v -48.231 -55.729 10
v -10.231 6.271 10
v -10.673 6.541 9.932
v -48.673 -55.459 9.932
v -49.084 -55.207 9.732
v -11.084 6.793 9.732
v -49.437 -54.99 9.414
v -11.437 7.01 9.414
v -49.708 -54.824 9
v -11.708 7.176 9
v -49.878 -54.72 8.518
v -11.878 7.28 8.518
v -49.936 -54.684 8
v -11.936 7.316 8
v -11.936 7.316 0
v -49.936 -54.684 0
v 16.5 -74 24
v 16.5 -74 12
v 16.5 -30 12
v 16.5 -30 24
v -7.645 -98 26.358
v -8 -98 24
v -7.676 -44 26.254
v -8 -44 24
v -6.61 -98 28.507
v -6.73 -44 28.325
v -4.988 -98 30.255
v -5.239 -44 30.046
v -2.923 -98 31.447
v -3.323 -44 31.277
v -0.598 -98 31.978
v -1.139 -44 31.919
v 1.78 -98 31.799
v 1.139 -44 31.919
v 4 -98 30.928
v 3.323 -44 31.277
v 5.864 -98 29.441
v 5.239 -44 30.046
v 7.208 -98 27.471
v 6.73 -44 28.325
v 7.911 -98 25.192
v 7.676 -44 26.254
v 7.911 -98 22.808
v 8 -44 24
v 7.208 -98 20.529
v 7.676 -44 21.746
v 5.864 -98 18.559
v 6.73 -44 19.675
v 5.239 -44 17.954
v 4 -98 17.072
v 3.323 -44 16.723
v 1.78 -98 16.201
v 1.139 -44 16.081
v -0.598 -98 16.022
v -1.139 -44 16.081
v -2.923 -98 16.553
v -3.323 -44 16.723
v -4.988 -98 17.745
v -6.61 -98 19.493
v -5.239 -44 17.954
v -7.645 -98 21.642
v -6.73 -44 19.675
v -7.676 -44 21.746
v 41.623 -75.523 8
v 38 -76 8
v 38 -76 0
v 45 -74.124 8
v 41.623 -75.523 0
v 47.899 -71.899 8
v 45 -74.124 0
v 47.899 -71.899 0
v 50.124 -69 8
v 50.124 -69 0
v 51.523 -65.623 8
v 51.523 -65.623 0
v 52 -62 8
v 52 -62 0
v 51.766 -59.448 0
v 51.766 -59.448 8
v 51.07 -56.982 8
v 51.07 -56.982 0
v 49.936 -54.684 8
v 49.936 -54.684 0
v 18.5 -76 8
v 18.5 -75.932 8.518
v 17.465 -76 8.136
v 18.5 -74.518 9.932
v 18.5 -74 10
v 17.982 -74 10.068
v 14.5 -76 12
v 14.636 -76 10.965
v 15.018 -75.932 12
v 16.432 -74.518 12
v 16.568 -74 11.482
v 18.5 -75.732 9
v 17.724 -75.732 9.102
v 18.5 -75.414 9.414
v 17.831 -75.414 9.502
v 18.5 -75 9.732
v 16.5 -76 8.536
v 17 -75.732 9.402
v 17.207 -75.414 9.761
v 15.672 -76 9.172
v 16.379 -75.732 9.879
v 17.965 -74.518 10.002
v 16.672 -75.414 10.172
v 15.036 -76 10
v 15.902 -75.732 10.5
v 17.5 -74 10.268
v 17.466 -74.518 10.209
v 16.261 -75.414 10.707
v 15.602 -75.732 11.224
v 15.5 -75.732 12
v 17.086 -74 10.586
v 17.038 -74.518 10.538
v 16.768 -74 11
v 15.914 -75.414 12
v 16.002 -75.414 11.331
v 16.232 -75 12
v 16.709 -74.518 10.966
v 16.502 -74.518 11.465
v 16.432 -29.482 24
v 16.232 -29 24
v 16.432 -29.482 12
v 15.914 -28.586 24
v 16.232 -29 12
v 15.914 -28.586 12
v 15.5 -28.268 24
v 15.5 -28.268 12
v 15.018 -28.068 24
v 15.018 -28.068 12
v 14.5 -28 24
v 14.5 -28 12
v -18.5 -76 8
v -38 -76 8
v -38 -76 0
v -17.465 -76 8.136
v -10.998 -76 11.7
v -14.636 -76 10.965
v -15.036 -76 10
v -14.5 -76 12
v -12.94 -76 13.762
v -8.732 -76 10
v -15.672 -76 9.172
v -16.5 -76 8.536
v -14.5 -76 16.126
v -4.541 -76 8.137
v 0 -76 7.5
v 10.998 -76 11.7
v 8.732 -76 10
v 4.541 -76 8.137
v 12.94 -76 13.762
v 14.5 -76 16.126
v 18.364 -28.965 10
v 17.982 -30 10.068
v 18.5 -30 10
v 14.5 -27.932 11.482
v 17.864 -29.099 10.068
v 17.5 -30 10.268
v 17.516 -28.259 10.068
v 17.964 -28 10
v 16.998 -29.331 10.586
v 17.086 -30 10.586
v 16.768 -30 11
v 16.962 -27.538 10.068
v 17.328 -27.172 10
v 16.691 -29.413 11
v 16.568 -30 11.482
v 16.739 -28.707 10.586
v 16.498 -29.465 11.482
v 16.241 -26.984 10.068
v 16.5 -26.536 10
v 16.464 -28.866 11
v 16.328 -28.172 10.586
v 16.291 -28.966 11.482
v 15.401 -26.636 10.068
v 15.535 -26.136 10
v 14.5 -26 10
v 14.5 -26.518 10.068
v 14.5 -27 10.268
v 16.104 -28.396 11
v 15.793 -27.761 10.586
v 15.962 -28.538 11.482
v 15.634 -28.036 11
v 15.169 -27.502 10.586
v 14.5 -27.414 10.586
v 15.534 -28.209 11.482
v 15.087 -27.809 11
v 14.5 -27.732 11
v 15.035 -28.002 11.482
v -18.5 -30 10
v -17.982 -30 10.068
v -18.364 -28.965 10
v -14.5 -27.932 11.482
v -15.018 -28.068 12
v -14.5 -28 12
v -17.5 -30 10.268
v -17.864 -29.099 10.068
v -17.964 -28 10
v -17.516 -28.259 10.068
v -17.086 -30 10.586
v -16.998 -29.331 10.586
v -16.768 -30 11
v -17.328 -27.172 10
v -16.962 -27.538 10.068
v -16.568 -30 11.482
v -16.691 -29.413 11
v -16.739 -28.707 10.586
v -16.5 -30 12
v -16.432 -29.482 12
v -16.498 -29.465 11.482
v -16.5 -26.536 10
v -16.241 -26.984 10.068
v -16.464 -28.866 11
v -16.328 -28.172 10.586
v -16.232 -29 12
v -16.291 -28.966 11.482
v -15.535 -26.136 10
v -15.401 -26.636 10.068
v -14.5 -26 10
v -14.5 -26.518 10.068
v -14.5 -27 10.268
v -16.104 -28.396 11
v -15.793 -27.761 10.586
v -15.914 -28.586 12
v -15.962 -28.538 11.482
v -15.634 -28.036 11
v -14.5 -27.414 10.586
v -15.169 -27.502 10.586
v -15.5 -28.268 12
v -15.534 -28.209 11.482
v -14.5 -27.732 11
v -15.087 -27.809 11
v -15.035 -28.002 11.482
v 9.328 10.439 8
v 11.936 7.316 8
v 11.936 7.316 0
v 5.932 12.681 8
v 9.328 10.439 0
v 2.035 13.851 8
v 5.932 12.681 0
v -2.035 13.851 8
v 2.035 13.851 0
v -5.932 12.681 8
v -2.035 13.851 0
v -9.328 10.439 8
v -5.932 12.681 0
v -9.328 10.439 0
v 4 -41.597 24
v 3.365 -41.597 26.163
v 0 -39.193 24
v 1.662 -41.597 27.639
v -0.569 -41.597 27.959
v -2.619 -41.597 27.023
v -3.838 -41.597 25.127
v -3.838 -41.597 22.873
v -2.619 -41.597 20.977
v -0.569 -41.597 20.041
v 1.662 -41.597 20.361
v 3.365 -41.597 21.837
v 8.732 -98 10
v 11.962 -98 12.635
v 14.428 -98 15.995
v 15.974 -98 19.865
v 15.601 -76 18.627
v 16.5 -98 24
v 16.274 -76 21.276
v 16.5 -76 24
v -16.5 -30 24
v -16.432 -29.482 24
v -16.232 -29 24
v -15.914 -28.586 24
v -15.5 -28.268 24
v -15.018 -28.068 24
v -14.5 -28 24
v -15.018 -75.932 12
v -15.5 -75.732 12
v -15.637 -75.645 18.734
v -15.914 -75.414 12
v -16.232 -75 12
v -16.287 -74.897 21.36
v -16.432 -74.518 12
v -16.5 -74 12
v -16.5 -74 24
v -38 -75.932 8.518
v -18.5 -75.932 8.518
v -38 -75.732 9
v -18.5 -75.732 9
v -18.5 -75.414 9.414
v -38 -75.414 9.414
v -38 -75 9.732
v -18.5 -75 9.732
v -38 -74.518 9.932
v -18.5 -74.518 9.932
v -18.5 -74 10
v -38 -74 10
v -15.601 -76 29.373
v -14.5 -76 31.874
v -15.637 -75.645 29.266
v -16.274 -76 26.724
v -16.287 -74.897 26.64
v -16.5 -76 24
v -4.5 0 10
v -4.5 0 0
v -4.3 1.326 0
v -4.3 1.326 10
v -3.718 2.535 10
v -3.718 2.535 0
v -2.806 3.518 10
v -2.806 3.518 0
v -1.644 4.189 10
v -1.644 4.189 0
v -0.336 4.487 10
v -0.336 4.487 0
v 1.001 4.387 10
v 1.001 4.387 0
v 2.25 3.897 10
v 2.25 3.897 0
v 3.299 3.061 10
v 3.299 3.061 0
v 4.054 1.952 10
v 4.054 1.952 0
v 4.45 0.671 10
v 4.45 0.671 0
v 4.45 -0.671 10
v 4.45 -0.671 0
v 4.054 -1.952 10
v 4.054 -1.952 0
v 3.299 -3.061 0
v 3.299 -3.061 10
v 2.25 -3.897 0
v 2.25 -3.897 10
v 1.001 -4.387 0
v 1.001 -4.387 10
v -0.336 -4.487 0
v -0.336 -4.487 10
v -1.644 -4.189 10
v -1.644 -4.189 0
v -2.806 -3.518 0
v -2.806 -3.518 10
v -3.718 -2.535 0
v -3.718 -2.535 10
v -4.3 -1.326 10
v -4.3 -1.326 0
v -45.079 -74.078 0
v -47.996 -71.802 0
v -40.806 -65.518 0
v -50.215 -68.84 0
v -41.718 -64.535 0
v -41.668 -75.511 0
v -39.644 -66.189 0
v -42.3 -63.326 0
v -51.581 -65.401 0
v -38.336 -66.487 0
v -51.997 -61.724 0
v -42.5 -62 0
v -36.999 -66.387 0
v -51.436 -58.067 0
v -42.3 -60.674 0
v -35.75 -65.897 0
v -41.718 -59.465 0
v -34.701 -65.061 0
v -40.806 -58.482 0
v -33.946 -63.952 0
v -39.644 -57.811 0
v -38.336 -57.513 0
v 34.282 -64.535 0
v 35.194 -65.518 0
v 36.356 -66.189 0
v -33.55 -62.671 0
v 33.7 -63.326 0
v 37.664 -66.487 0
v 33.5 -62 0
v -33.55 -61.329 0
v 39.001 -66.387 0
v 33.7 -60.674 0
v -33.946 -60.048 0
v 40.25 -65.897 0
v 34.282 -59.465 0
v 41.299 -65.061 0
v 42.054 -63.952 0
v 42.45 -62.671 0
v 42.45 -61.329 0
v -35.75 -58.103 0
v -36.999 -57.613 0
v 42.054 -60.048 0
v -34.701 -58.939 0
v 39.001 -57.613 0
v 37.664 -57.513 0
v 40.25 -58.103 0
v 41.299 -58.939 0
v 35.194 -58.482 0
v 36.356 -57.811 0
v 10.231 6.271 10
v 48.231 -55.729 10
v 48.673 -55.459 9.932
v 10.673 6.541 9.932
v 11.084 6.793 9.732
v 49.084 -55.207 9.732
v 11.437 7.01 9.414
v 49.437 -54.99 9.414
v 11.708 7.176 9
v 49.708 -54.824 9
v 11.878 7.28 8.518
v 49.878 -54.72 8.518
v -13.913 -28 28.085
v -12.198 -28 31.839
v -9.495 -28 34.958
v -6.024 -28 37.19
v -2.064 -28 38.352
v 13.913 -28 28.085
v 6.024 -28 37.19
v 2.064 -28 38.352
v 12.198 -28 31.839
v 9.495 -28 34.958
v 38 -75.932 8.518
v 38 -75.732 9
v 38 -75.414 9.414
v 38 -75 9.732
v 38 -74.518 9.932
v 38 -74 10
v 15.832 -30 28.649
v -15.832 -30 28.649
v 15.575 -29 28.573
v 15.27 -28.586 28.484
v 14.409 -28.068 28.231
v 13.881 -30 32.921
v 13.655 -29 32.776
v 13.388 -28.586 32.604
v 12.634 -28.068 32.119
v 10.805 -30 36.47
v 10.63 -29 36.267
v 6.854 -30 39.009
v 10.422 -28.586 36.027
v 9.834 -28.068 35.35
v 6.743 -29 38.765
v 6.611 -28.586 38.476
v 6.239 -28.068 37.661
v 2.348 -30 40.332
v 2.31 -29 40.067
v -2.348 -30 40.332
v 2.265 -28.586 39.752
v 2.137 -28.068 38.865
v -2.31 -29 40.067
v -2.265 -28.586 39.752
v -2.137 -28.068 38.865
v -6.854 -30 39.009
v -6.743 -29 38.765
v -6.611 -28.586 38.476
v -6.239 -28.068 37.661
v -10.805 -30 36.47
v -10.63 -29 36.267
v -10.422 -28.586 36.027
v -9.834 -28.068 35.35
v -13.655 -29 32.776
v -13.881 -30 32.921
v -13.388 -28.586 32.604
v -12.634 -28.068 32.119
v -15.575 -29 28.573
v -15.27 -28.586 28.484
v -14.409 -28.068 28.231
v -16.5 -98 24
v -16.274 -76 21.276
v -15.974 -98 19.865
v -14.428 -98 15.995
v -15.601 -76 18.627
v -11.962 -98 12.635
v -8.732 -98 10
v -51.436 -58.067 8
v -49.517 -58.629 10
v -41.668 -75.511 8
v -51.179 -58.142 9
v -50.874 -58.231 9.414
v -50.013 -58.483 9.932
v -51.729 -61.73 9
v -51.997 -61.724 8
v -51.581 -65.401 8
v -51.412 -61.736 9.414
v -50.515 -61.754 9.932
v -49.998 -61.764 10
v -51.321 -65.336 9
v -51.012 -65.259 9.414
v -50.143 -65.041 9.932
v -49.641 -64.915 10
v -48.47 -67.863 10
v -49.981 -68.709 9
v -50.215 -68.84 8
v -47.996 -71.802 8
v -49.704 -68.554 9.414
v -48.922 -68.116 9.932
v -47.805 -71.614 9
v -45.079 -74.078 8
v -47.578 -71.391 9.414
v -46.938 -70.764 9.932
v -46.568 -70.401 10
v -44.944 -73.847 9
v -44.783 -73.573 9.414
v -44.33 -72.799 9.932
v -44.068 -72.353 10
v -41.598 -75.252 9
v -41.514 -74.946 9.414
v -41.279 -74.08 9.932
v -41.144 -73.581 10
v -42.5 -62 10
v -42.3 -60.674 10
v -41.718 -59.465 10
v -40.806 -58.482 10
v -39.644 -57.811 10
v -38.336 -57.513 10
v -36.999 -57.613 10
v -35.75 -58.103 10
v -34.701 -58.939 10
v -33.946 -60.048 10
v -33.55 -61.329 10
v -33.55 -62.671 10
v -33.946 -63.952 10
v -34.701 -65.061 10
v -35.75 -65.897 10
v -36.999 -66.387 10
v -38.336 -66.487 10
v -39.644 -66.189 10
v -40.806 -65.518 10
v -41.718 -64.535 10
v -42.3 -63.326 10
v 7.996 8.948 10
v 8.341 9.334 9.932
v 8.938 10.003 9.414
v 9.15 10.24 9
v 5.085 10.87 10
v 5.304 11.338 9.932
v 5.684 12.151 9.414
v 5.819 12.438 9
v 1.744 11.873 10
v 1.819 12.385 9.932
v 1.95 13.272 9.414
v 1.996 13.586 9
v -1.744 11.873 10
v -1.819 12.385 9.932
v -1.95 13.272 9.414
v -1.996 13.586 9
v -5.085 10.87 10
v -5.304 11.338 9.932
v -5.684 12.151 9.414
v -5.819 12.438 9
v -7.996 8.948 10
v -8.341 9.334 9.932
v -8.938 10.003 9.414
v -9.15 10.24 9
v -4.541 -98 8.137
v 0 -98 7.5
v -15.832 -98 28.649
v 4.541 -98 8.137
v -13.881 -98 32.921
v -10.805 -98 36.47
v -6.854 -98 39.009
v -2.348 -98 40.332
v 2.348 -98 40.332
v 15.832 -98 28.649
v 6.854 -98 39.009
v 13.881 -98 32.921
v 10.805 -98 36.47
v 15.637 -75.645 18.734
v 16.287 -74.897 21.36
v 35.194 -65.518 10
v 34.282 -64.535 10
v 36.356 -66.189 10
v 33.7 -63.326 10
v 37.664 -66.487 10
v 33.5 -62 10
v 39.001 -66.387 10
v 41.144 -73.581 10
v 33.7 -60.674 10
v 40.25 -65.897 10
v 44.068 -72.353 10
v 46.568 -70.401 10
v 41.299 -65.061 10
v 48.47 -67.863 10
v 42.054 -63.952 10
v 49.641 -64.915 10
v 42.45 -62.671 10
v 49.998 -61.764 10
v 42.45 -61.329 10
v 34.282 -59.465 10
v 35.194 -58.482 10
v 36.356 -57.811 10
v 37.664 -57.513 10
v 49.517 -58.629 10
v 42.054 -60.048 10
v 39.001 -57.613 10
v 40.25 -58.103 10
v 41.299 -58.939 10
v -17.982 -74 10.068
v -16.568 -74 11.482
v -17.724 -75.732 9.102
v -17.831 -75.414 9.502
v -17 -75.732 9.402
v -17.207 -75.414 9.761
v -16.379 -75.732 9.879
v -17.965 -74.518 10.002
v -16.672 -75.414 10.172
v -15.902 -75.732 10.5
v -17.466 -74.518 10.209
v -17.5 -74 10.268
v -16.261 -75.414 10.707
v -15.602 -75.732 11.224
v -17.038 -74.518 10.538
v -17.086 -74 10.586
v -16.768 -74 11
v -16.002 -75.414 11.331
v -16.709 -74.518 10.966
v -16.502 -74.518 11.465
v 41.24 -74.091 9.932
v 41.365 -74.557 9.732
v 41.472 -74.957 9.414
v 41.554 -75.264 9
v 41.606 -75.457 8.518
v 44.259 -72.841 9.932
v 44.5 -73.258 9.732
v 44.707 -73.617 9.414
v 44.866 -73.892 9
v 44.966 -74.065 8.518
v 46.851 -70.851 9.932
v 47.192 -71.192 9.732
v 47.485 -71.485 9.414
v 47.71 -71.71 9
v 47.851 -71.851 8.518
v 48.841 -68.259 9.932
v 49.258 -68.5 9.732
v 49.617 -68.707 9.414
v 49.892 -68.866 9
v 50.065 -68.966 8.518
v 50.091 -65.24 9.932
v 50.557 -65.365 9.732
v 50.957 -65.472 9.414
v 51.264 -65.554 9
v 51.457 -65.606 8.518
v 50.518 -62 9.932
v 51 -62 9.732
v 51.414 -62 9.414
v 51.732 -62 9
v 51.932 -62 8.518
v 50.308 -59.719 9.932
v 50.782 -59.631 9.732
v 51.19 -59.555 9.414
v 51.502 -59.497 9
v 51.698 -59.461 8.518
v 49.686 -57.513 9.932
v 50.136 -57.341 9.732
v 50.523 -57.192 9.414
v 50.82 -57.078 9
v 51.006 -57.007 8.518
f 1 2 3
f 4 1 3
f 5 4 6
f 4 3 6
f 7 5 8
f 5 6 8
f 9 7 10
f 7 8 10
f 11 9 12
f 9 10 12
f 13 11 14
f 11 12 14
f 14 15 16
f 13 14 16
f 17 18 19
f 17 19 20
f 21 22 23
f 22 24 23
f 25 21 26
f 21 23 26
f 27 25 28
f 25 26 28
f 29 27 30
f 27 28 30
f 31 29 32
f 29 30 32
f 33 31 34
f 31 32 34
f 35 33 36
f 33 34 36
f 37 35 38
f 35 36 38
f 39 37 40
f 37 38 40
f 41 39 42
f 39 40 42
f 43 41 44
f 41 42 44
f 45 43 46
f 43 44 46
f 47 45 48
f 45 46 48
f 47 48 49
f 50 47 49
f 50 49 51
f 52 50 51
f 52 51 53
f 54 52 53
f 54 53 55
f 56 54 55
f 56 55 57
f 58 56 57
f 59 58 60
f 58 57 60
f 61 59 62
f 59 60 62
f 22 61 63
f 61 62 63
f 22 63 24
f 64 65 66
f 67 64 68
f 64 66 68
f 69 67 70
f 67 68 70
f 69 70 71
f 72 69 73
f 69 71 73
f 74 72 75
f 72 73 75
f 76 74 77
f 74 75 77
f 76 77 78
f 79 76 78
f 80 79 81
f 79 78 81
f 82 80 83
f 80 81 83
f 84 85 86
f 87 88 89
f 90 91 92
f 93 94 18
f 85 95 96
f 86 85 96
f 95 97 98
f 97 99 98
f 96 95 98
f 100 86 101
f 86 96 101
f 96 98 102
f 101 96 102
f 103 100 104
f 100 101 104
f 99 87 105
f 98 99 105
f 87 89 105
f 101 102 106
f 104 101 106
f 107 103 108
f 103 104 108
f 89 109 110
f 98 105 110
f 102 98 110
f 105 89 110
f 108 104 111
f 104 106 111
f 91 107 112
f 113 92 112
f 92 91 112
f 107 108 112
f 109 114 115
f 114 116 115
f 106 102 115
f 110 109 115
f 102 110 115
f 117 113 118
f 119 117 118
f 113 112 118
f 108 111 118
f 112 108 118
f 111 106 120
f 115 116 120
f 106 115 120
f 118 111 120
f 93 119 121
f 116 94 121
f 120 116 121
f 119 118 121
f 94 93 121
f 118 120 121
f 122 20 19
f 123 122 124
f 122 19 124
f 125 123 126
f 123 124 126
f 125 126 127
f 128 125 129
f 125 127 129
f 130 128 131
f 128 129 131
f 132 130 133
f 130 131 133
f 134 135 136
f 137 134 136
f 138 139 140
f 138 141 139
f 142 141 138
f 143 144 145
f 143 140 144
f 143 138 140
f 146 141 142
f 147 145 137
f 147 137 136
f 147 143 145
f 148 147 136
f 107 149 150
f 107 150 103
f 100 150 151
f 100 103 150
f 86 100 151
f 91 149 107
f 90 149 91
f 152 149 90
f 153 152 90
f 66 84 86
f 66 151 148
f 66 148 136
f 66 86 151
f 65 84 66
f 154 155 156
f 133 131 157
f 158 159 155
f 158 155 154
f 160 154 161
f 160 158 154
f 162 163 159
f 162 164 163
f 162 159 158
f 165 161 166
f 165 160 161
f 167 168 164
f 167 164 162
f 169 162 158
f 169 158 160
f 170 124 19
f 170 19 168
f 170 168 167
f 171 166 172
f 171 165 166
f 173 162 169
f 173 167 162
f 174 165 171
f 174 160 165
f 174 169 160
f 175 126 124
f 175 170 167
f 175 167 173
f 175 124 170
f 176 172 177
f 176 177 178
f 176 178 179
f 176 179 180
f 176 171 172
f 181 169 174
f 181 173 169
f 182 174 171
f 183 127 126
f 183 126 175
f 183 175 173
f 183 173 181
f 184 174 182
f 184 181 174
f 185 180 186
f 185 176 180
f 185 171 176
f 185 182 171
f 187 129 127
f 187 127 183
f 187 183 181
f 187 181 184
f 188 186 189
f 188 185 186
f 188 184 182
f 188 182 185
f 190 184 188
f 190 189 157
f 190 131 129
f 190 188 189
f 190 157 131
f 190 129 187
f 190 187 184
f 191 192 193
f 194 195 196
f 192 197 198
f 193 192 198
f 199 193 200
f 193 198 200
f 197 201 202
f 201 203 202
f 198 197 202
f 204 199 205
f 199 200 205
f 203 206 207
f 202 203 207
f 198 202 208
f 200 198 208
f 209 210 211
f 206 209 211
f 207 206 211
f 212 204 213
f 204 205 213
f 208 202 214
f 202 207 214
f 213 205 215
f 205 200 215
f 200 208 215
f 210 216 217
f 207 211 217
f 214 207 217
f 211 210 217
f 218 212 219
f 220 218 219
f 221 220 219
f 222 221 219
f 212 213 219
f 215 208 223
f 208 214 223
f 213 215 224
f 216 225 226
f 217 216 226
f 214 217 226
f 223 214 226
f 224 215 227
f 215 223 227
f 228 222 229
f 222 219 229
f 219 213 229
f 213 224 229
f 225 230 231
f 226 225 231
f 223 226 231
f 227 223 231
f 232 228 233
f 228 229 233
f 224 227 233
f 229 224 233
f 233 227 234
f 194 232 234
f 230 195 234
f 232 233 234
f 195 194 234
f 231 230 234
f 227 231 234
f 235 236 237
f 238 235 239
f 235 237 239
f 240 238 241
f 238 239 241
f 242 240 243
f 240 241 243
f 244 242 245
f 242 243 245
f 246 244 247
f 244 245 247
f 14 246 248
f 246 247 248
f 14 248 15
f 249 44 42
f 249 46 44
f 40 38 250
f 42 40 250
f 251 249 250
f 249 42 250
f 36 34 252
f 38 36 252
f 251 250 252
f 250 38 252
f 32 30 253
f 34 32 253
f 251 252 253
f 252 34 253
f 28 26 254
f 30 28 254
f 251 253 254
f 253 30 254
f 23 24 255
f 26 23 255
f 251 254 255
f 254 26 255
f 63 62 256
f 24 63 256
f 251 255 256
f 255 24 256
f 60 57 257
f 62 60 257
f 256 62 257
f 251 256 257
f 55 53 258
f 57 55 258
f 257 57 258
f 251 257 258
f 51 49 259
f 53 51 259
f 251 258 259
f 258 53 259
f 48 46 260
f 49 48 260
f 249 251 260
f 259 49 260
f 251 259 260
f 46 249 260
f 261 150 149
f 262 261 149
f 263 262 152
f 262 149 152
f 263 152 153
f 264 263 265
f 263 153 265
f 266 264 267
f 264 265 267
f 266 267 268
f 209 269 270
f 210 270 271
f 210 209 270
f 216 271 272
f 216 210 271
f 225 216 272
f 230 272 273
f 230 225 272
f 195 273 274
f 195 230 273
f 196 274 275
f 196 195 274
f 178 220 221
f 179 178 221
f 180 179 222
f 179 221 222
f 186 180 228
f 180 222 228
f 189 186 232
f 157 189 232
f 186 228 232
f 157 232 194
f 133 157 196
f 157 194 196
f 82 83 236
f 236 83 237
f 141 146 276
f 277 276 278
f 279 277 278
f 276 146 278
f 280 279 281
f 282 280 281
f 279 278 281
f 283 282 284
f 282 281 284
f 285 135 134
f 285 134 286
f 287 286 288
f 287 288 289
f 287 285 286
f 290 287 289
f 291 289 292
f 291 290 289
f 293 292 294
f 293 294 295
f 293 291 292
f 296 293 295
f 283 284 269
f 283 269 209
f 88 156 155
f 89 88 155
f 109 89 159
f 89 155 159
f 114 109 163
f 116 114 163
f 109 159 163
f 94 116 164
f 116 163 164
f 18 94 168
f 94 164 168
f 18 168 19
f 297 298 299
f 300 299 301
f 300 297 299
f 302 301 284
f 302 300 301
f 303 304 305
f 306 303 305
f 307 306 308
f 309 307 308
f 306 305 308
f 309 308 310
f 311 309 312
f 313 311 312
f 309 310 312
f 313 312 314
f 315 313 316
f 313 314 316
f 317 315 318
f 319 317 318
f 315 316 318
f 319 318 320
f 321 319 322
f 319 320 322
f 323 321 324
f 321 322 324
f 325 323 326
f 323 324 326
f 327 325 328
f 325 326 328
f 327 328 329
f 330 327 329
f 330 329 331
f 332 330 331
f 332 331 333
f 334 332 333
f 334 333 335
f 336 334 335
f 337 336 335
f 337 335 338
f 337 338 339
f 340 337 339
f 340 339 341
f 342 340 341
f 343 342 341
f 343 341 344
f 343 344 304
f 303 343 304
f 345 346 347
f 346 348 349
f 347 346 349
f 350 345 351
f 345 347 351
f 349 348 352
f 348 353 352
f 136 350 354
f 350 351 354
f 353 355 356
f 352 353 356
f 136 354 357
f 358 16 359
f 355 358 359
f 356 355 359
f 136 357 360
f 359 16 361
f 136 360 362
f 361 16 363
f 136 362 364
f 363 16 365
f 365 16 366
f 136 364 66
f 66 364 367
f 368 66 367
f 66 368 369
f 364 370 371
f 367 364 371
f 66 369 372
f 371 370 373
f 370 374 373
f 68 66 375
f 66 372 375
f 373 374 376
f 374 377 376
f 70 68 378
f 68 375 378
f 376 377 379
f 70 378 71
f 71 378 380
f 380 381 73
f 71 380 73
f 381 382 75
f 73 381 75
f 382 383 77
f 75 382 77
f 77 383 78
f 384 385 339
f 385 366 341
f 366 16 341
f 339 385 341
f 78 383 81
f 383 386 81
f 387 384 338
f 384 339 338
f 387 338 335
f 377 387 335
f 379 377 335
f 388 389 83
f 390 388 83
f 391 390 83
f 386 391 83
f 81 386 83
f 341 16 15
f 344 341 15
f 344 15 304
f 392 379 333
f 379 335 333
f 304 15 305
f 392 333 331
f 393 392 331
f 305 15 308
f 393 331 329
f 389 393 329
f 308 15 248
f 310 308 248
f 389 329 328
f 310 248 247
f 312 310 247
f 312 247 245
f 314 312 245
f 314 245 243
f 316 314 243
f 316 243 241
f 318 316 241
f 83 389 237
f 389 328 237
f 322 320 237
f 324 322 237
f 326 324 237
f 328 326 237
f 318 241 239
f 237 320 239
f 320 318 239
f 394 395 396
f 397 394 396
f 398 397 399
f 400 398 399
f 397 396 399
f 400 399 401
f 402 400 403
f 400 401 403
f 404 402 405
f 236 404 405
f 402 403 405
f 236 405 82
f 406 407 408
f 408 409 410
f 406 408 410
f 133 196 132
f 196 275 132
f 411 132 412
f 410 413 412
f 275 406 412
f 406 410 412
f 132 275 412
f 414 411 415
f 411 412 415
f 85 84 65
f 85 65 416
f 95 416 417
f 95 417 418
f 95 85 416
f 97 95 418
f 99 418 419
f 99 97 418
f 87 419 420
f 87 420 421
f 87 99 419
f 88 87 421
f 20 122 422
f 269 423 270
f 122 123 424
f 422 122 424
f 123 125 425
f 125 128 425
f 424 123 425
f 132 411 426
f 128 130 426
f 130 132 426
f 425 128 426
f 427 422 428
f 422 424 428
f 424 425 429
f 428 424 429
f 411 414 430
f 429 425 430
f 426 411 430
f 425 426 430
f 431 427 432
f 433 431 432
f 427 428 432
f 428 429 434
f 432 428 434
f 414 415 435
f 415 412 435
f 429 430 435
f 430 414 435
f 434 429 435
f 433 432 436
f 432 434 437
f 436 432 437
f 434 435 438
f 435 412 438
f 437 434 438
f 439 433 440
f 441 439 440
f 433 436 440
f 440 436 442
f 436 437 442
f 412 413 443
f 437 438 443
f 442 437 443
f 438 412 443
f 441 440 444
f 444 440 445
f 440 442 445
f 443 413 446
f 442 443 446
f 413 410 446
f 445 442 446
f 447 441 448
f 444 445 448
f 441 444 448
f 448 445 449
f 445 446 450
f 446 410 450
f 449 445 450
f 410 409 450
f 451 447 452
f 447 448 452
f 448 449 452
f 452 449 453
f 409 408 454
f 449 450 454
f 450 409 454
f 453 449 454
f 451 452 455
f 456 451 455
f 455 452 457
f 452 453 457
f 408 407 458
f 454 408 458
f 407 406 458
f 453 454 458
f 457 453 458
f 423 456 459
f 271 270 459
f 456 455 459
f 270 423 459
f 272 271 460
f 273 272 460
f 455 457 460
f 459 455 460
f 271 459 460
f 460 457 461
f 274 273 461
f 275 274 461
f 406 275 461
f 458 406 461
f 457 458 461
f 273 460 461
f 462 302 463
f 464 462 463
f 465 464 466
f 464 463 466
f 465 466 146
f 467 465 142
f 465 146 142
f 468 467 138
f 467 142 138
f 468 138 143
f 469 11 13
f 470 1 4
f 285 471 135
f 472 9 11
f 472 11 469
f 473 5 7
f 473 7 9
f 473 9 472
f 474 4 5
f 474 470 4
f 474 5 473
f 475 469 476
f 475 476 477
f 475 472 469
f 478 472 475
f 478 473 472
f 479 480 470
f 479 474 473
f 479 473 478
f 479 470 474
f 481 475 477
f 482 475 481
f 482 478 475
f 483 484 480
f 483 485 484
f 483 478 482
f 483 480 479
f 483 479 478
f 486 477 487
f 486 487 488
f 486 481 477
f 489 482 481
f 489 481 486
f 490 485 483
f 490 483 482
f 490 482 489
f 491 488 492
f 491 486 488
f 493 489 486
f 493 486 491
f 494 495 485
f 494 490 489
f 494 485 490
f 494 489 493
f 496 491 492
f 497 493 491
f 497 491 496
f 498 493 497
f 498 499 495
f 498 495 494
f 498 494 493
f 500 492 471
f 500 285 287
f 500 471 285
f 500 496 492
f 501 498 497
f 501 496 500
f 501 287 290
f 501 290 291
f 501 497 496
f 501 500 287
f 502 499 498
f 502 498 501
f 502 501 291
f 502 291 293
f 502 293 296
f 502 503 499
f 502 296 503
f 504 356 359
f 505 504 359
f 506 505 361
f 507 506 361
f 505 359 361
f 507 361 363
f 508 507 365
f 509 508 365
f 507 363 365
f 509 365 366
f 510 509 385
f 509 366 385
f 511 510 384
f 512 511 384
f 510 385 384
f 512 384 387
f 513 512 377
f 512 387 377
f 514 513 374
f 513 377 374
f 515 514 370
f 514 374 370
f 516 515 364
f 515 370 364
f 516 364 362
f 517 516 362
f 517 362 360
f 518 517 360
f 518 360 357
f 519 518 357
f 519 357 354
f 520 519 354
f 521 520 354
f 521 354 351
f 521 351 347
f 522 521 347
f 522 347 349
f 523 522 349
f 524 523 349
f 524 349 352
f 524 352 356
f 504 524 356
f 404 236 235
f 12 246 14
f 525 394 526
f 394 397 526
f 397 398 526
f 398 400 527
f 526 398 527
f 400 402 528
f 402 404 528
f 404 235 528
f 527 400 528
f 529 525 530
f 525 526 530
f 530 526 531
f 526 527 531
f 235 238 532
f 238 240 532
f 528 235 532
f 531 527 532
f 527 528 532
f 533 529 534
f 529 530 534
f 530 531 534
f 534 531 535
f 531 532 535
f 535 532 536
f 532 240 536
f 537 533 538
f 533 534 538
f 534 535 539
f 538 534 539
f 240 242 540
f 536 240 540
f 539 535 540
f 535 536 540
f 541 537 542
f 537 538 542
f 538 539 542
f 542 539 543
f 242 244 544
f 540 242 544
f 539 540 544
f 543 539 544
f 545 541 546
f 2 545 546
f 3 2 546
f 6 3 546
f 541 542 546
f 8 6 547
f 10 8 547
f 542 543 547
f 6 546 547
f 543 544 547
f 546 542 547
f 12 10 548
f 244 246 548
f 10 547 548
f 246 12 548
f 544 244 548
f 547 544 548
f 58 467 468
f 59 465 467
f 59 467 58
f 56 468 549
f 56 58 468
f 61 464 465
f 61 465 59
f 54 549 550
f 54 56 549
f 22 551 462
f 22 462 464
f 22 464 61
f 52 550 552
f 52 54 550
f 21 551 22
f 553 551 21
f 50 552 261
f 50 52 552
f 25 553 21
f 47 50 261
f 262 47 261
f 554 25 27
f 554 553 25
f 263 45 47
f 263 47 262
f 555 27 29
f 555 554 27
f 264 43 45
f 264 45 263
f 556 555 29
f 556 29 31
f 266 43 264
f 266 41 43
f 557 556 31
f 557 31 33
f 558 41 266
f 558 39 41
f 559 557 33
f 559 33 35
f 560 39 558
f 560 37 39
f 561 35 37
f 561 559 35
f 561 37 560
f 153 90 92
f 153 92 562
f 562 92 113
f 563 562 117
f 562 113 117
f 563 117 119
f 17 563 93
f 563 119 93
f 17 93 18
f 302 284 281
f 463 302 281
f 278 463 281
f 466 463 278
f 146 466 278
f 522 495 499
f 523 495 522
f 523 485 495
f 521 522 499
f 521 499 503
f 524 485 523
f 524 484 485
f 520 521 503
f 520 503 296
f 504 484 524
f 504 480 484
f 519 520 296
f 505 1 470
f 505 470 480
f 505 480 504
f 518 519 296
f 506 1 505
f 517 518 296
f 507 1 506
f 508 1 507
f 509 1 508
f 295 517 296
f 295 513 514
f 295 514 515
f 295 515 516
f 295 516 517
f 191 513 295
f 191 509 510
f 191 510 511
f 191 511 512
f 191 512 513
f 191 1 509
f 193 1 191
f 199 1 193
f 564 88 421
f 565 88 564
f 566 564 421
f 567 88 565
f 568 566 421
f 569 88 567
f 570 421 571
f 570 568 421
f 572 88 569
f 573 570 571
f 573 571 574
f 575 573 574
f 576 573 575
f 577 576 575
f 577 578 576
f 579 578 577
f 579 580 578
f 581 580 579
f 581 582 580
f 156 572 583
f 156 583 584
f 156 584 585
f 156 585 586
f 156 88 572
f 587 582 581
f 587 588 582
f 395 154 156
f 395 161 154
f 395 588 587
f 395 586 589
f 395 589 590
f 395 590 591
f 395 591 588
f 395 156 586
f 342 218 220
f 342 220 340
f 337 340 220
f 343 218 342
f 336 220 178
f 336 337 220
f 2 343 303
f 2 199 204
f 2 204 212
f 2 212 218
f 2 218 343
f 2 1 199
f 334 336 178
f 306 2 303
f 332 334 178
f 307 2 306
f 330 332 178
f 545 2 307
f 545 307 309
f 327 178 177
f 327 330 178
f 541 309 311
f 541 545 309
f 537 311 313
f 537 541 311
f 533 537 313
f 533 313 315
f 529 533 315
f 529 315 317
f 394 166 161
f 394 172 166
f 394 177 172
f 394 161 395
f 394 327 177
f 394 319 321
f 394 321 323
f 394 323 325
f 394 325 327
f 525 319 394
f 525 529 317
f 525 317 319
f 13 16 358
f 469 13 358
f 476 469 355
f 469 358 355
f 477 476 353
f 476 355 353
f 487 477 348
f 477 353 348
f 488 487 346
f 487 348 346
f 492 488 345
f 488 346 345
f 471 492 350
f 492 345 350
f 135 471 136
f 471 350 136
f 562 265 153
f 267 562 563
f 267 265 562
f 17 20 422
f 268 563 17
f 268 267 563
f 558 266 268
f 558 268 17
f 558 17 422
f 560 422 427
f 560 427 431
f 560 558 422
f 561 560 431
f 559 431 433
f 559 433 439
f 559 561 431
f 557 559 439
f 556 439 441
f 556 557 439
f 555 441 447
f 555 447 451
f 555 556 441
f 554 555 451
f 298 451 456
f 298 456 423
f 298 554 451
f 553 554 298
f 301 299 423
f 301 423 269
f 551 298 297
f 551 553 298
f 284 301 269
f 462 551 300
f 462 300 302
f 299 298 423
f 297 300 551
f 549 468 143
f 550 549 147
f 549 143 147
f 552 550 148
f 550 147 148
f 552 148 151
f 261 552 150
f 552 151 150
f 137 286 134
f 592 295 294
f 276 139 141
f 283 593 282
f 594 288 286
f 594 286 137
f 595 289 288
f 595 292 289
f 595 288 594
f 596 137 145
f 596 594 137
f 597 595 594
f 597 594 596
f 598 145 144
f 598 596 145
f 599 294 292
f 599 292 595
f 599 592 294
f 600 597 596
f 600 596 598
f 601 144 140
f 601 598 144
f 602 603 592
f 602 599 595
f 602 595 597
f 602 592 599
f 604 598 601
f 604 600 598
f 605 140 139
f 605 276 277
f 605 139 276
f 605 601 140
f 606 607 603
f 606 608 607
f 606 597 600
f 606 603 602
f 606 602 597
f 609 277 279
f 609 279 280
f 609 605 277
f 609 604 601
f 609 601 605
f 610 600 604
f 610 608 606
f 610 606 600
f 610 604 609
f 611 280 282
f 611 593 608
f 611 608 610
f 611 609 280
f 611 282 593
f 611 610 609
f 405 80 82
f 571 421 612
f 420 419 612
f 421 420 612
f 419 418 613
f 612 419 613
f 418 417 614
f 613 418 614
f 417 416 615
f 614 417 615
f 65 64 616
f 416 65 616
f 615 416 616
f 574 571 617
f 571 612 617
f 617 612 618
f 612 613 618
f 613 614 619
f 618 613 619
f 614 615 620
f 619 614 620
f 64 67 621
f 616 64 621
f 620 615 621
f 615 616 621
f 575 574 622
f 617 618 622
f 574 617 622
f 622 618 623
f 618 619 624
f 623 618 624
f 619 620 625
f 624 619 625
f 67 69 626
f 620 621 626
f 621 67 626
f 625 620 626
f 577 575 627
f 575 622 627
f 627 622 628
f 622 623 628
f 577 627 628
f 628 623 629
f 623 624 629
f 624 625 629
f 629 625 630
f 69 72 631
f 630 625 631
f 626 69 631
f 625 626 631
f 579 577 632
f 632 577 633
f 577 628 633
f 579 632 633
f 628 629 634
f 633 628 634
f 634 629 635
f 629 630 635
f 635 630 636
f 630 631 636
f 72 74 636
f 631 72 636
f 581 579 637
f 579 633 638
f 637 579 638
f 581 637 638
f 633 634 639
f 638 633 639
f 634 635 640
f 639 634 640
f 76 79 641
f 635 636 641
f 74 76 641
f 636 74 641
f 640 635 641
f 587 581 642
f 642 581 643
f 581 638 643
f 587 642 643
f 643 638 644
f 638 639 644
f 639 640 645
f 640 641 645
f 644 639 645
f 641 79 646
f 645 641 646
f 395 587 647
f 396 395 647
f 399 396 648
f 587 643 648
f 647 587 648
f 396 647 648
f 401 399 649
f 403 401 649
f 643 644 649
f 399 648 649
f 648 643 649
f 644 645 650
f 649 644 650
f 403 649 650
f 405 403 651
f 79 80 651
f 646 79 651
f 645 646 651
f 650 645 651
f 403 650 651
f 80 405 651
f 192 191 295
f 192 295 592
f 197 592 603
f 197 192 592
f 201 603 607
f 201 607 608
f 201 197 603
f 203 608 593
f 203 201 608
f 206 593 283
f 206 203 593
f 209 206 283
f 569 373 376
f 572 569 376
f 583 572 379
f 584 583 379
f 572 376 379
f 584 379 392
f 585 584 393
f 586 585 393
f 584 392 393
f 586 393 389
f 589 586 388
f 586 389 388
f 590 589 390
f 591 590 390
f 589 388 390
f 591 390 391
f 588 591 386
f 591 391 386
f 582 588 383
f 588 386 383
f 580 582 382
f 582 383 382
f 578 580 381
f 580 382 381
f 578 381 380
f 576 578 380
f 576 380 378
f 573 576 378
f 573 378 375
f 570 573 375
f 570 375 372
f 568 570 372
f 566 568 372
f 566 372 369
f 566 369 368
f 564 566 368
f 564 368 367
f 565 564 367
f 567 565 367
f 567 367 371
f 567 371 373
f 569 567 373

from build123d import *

# Parameters (mm, degrees)
F1_DEPTH     = 10
F3_DEPTH     = 22
F4_DEPTH     = 48
F6_D         = 16
F6_DEPTH     = 54
F6_TIP       = 4.8068849522
F7_T1_DEPTH  = 14
F7_T4_ANGLE  = 180
F7_T5_DEPTH  = 46
F7_T7_DEPTH  = 29
F7_T10_ANGLE = 90
F7_T12_ANGLE = 90
F7_T13_DEPTH = 19.5
F7_T15_DEPTH = 19.5
F7_T17_DEPTH = 72.7186358508
F7_T19_DEPTH = 72.7186358508
F7_T22_ANGLE = 121.5042667192
F7_T26_DEPTH = 20.5
F7_S27_R     = 16.5
F7_T28_DEPTH = 12
F7_T32_DEPTH = 20.5
F7_S33_R     = 16.5
F7_T34_DEPTH = 12
F7_T36_ANGLE = 121.5042667192
F7_T38_ANGLE = 116.9914665616
F7_T40_ANGLE = 90
F7_T42_ANGLE = 90
F9_D         = 9


# Not quite as in the source:
# - a fillet or chamfer that OpenCascade refuses, or shapes differently, is made with other operations: its cross-section is extruded or revolved along the edge and cut away or added


with BuildPart() as f1:
    # F0 (on Top) → F1 (new body)
    with BuildSketch(Plane.XY):
        with BuildLine():
            ThreePointArc((11.9364175338, 7.315868811), (13.4742318051, 3.8006680023), (14, 0))
            ThreePointArc((14, 0), (-3.8006680023, -13.4742318051), (-11.9364175338, 7.315868811))
            Line((-11.9364175338, 7.315868811), (-49.9364175338, -54.684131189))
            ThreePointArc((-49.9364175338, -54.684131189), (-34.1993319977, -48.5257681949), (-24, -62))
            ThreePointArc((-24, -62), (-28.1005050634, -71.8994949366), (-38, -76))
            Line((-38, -76), (38, -76))
            ThreePointArc((38, -76), (25.7848012019, -55.1597574368), (49.9364175338, -54.684131189))
            Line((49.9364175338, -54.684131189), (11.9364175338, 7.315868811))
        make_face()
        with BuildLine():
            ThreePointArc((-24, -62), (-34.1993319977, -48.5257681949), (-49.9364175338, -54.684131189))
            ThreePointArc((-49.9364175338, -54.684131189), (-50.2151987981, -68.8402425632), (-38, -76))
            ThreePointArc((-38, -76), (-28.1005050634, -71.8994949366), (-24, -62))
        make_face()
        with BuildLine():
            ThreePointArc((-11.9364175338, 7.315868811), (-3.8006680023, -13.4742318051), (14, 0))
            ThreePointArc((14, 0), (13.4742318051, 3.8006680023), (11.9364175338, 7.315868811))
            ThreePointArc((11.9364175338, 7.315868811), (0, 14), (-11.9364175338, 7.315868811))
        make_face()
        with BuildLine():
            ThreePointArc((52, -62), (51.4742318051, -58.1993319977), (49.9364175338, -54.684131189))
            ThreePointArc((49.9364175338, -54.684131189), (25.7848012019, -55.1597574368), (38, -76))
            ThreePointArc((38, -76), (47.8994949366, -71.8994949366), (52, -62))
        make_face()
    extrude(amount=F1_DEPTH)

    # F2 (on face) → F3 (join)
    with BuildSketch(Plane.XZ.offset(76)):
        with BuildLine():
            ThreePointArc((8.7321245983, 10), (14.4279252818, 15.9946910076), (16.5, 24))
            ThreePointArc((16.5, 24), (0, 40.5), (-16.5, 24))
            ThreePointArc((-16.5, 24), (-14.4279252818, 15.9946910076), (-8.7321245983, 10))
            Line((-8.7321245983, 10), (8.7321245983, 10))
        make_face()
        with BuildLine():
            ThreePointArc((-8.7321245983, 10), (0, 7.5), (8.7321245983, 10))
            Line((8.7321245983, 10), (-8.7321245983, 10))
        make_face()
    extrude(amount=F3_DEPTH)

    # F2 (on face) → F4 (join)
    with BuildSketch(Plane.XZ.offset(76)):
        with BuildLine():
            Line((16.5, 10), (16.5, 24))
            ThreePointArc((16.5, 24), (14.4279252818, 15.9946910076), (8.7321245983, 10))
            Line((8.7321245983, 10), (16.5, 10))
        make_face()
        with BuildLine():
            ThreePointArc((8.7321245983, 10), (14.4279252818, 15.9946910076), (16.5, 24))
            ThreePointArc((16.5, 24), (0, 40.5), (-16.5, 24))
            ThreePointArc((-16.5, 24), (-14.4279252818, 15.9946910076), (-8.7321245983, 10))
            Line((-8.7321245983, 10), (8.7321245983, 10))
        make_face()
        with BuildLine():
            ThreePointArc((-8.7321245983, 10), (-14.4279252818, 15.9946910076), (-16.5, 24))
            Line((-16.5, 24), (-16.5, 10))
            Line((-16.5, 10), (-8.7321245983, 10))
        make_face()
    extrude(amount=-F4_DEPTH)

    # F6
    with Locations(Plane.XZ.offset(98)):
        with Locations((0, 24)):
            Hole(F6_D / 2, depth=F6_DEPTH)
            with Locations((0, 0, -(F6_DEPTH + F6_TIP / 2))):  # 118° drill point
                Cone(0, F6_D / 2, F6_TIP, mode=Mode.SUBTRACT)

    # F7: fillet of radius 2 on 15 edges, made by hand

    # F7_s2 → F7_t1 (cut)
    with BuildSketch(Plane.XY.offset(10)):
        with BuildLine():
            ThreePointArc((-16.5, -30), (-15.9142135624, -28.5857864376), (-14.5, -28))
            Line((-14.5, -28), (-16.5, -28))
            Line((-16.5, -28), (-16.5, -30))
        make_face()
        with BuildLine():
            ThreePointArc((16.5, -30), (15.9142135624, -28.5857864376), (14.5, -28))
            Line((14.5, -28), (16.5, -28))
            Line((16.5, -28), (16.5, -30))
        make_face()
    extrude(amount=F7_T1_DEPTH, mode=Mode.SUBTRACT)

    # F7_s3 → F7_t4 (revolve, cut)
    with BuildSketch(Plane.XY.offset(24)):
        with BuildLine():
            ThreePointArc((16.5, -30), (15.9142135624, -28.5857864376), (14.5, -28))
            Line((14.5, -28), (16.5, -28))
            Line((16.5, -28), (16.5, -30))
        make_face()
    revolve(axis=Axis((0, -28, 24), (0, -1, 0)), revolution_arc=F7_T4_ANGLE, mode=Mode.SUBTRACT)

    # F7_s6 → F7_t5 (join)
    with BuildSketch(Plane.XZ.offset(30)):
        with BuildLine():
            ThreePointArc((18.5, 10), (17.0857864376, 10.5857864376), (16.5, 12))
            Line((16.5, 12), (16.5, 10))
            Line((16.5, 10), (18.5, 10))
        make_face()
        with BuildLine():
            ThreePointArc((-18.5, 10), (-17.0857864376, 10.5857864376), (-16.5, 12))
            Line((-16.5, 12), (-16.5, 10))
            Line((-16.5, 10), (-18.5, 10))
        make_face()
    extrude(amount=F7_T5_DEPTH)

    # F7_s8 → F7_t7 (join)
    with BuildSketch(Plane.YZ.offset(-14.5)):
        with BuildLine():
            ThreePointArc((-26, 10), (-27.4142135624, 10.5857864376), (-28, 12))
            Line((-28, 12), (-28, 10))
            Line((-28, 10), (-26, 10))
        make_face()
    extrude(amount=F7_T7_DEPTH)

    # F7_s9 → F7_t10 (revolve)
    with BuildSketch(Plane.XZ.offset(30)):
        with BuildLine():
            ThreePointArc((-18.5, 10), (-17.0857864376, 10.5857864376), (-16.5, 12))
            Line((-16.5, 12), (-16.5, 10))
            Line((-16.5, 10), (-18.5, 10))
        make_face()
    revolve(axis=Axis((-14.5, -30, 10), (0, 0, -1)), revolution_arc=F7_T10_ANGLE)

    # F7_s11 → F7_t12 (revolve)
    with BuildSketch(Plane.XZ.offset(30)):
        with BuildLine():
            ThreePointArc((18.5, 10), (17.0857864376, 10.5857864376), (16.5, 12))
            Line((16.5, 12), (16.5, 10))
            Line((16.5, 10), (18.5, 10))
        make_face()
    revolve(axis=Axis((14.5, -30, 10), (0, 0, 1)), revolution_arc=F7_T12_ANGLE)

    # F7_s14 → F7_t13 (cut)
    with BuildSketch(Plane.YZ.offset(-38)):
        with BuildLine():
            ThreePointArc((-76, 8), (-75.4142135624, 9.4142135624), (-74, 10))
            Line((-74, 10), (-76, 10))
            Line((-76, 10), (-76, 8))
        make_face()
    extrude(amount=F7_T13_DEPTH, mode=Mode.SUBTRACT)

    # F7_s16 → F7_t15 (cut)
    with BuildSketch(Plane.YZ.offset(18.5)):
        with BuildLine():
            ThreePointArc((-76, 8), (-75.4142135624, 9.4142135624), (-74, 10))
            Line((-74, 10), (-76, 10))
            Line((-76, 10), (-76, 8))
        make_face()
    extrude(amount=F7_T15_DEPTH, mode=Mode.SUBTRACT)

    # F7_s18 → F7_t17 (cut)
    with BuildSketch(Plane(origin=(0, 0, 0), x_dir=(0, 0, 1), z_dir=(-0.5225620579, -0.8526012524, 0))):
        with BuildLine():
            ThreePointArc((10, 12), (9.4142135624, 13.4142135624), (8, 14))
            Line((8, 14), (10, 14))
            Line((10, 14), (10, 12))
        make_face()
    extrude(amount=F7_T17_DEPTH, mode=Mode.SUBTRACT)

    # F7_s20 → F7_t19 (cut)
    with BuildSketch(Plane(origin=(38, -62, 0), x_dir=(0, 0, 1), z_dir=(-0.5225620579, 0.8526012524, 0))):
        with BuildLine():
            ThreePointArc((10, 12), (9.4142135624, 13.4142135624), (8, 14))
            Line((8, 14), (10, 14))
            Line((10, 14), (10, 12))
        make_face()
    extrude(amount=F7_T19_DEPTH, mode=Mode.SUBTRACT)

    # F7_s21 → F7_t22 (revolve, cut)
    with BuildSketch(Plane.YZ.offset(38)):
        with BuildLine():
            ThreePointArc((-74, 10), (-75.4142135624, 9.4142135624), (-76, 8))
            Line((-76, 8), (-76, 10))
            Line((-76, 10), (-74, 10))
        make_face()
    revolve(axis=Axis((38, -62, 10), (0, 0, 1)), revolution_arc=F7_T22_ANGLE, mode=Mode.SUBTRACT)


with BuildPart() as f7_tool24:
    # F7_s25 → F7_t26 (new body)
    with BuildSketch(Plane.XY.offset(12)):
        with BuildLine():
            ThreePointArc((14.5, -76), (15.9142135624, -75.4142135624), (16.5, -74))
            Line((16.5, -74), (16.5, -76))
            Line((16.5, -76), (14.5, -76))
        make_face()
    extrude(amount=F7_T26_DEPTH)

    # F7_s27 → F7_t28 (cut, symmetric)
    with BuildSketch(Plane.XZ.offset(75)):
        with Locations((0, 24)):
            Circle(F7_S27_R)
    extrude(amount=F7_T28_DEPTH, both=True, mode=Mode.SUBTRACT)


with BuildPart() as f1_1:
    add(f1.part)

    # F7_t23: cut F7_tool24
    add(f7_tool24.part, mode=Mode.SUBTRACT)


with BuildPart() as f7_tool30:
    # F7_s31 → F7_t32 (new body)
    with BuildSketch(Plane.XY.offset(32.5)):
        with BuildLine():
            ThreePointArc((-14.5, -76), (-15.9142135624, -75.4142135624), (-16.5, -74))
            Line((-16.5, -74), (-16.5, -76))
            Line((-16.5, -76), (-14.5, -76))
        make_face()
    extrude(amount=-F7_T32_DEPTH)

    # F7_s33 → F7_t34 (cut, symmetric)
    with BuildSketch(Plane.XZ.offset(75)):
        with Locations((0, 24)):
            Circle(F7_S33_R)
    extrude(amount=F7_T34_DEPTH, both=True, mode=Mode.SUBTRACT)


with BuildPart() as f1_2:
    add(f1_1.part)

    # F7_t29: cut F7_tool30
    add(f7_tool30.part, mode=Mode.SUBTRACT)

    # F7_s35 → F7_t36 (revolve, cut)
    with BuildSketch(Plane(origin=(-38, -62, 0), x_dir=(0, 0, 1), z_dir=(0.5225620579, 0.8526012524, 0))):
        with BuildLine():
            ThreePointArc((8, -14), (9.4142135624, -13.4142135624), (10, -12))
            Line((10, -12), (10, -14))
            Line((10, -14), (8, -14))
        make_face()
    revolve(axis=Axis((-38, -62, 10), (0, 0, 1)), revolution_arc=F7_T36_ANGLE, mode=Mode.SUBTRACT)

    # F7_s37 → F7_t38 (revolve, cut)
    with BuildSketch(Plane(origin=(0, 0, 0), x_dir=(0, 0, 1), z_dir=(0.5225620579, -0.8526012524, 0))):
        with BuildLine():
            ThreePointArc((10, -12), (9.4142135624, -13.4142135624), (8, -14))
            Line((8, -14), (10, -14))
            Line((10, -14), (10, -12))
        make_face()
    revolve(axis=Axis((0, 0, 10), (0, 0, 1)), revolution_arc=F7_T38_ANGLE, mode=Mode.SUBTRACT)

    # F7_s39 → F7_t40 (revolve, cut)
    with BuildSketch(Plane.YZ.offset(18.5)):
        with BuildLine():
            ThreePointArc((-76, 8), (-75.4142135624, 9.4142135624), (-74, 10))
            Line((-74, 10), (-76, 10))
            Line((-76, 10), (-76, 8))
        make_face()
    revolve(axis=Axis((18.5, -76, 12), (0, 1, 0)), revolution_arc=F7_T40_ANGLE, mode=Mode.SUBTRACT)

    # F7_s41 → F7_t42 (revolve, cut)
    with BuildSketch(Plane.YZ.offset(-18.5)):
        with BuildLine():
            ThreePointArc((-76, 8), (-75.4142135624, 9.4142135624), (-74, 10))
            Line((-74, 10), (-76, 10))
            Line((-76, 10), (-76, 8))
        make_face()
    revolve(axis=Axis((-18.5, -76, 12), (0, -1, 0)), revolution_arc=F7_T42_ANGLE, mode=Mode.SUBTRACT)

    # F9 (through all)
    with Locations(Plane.XY.offset(10)):
        with Locations((38, -62), (0, 0), (-38, -62)):
            Hole(F9_D / 2)


solid = f1_2.part
